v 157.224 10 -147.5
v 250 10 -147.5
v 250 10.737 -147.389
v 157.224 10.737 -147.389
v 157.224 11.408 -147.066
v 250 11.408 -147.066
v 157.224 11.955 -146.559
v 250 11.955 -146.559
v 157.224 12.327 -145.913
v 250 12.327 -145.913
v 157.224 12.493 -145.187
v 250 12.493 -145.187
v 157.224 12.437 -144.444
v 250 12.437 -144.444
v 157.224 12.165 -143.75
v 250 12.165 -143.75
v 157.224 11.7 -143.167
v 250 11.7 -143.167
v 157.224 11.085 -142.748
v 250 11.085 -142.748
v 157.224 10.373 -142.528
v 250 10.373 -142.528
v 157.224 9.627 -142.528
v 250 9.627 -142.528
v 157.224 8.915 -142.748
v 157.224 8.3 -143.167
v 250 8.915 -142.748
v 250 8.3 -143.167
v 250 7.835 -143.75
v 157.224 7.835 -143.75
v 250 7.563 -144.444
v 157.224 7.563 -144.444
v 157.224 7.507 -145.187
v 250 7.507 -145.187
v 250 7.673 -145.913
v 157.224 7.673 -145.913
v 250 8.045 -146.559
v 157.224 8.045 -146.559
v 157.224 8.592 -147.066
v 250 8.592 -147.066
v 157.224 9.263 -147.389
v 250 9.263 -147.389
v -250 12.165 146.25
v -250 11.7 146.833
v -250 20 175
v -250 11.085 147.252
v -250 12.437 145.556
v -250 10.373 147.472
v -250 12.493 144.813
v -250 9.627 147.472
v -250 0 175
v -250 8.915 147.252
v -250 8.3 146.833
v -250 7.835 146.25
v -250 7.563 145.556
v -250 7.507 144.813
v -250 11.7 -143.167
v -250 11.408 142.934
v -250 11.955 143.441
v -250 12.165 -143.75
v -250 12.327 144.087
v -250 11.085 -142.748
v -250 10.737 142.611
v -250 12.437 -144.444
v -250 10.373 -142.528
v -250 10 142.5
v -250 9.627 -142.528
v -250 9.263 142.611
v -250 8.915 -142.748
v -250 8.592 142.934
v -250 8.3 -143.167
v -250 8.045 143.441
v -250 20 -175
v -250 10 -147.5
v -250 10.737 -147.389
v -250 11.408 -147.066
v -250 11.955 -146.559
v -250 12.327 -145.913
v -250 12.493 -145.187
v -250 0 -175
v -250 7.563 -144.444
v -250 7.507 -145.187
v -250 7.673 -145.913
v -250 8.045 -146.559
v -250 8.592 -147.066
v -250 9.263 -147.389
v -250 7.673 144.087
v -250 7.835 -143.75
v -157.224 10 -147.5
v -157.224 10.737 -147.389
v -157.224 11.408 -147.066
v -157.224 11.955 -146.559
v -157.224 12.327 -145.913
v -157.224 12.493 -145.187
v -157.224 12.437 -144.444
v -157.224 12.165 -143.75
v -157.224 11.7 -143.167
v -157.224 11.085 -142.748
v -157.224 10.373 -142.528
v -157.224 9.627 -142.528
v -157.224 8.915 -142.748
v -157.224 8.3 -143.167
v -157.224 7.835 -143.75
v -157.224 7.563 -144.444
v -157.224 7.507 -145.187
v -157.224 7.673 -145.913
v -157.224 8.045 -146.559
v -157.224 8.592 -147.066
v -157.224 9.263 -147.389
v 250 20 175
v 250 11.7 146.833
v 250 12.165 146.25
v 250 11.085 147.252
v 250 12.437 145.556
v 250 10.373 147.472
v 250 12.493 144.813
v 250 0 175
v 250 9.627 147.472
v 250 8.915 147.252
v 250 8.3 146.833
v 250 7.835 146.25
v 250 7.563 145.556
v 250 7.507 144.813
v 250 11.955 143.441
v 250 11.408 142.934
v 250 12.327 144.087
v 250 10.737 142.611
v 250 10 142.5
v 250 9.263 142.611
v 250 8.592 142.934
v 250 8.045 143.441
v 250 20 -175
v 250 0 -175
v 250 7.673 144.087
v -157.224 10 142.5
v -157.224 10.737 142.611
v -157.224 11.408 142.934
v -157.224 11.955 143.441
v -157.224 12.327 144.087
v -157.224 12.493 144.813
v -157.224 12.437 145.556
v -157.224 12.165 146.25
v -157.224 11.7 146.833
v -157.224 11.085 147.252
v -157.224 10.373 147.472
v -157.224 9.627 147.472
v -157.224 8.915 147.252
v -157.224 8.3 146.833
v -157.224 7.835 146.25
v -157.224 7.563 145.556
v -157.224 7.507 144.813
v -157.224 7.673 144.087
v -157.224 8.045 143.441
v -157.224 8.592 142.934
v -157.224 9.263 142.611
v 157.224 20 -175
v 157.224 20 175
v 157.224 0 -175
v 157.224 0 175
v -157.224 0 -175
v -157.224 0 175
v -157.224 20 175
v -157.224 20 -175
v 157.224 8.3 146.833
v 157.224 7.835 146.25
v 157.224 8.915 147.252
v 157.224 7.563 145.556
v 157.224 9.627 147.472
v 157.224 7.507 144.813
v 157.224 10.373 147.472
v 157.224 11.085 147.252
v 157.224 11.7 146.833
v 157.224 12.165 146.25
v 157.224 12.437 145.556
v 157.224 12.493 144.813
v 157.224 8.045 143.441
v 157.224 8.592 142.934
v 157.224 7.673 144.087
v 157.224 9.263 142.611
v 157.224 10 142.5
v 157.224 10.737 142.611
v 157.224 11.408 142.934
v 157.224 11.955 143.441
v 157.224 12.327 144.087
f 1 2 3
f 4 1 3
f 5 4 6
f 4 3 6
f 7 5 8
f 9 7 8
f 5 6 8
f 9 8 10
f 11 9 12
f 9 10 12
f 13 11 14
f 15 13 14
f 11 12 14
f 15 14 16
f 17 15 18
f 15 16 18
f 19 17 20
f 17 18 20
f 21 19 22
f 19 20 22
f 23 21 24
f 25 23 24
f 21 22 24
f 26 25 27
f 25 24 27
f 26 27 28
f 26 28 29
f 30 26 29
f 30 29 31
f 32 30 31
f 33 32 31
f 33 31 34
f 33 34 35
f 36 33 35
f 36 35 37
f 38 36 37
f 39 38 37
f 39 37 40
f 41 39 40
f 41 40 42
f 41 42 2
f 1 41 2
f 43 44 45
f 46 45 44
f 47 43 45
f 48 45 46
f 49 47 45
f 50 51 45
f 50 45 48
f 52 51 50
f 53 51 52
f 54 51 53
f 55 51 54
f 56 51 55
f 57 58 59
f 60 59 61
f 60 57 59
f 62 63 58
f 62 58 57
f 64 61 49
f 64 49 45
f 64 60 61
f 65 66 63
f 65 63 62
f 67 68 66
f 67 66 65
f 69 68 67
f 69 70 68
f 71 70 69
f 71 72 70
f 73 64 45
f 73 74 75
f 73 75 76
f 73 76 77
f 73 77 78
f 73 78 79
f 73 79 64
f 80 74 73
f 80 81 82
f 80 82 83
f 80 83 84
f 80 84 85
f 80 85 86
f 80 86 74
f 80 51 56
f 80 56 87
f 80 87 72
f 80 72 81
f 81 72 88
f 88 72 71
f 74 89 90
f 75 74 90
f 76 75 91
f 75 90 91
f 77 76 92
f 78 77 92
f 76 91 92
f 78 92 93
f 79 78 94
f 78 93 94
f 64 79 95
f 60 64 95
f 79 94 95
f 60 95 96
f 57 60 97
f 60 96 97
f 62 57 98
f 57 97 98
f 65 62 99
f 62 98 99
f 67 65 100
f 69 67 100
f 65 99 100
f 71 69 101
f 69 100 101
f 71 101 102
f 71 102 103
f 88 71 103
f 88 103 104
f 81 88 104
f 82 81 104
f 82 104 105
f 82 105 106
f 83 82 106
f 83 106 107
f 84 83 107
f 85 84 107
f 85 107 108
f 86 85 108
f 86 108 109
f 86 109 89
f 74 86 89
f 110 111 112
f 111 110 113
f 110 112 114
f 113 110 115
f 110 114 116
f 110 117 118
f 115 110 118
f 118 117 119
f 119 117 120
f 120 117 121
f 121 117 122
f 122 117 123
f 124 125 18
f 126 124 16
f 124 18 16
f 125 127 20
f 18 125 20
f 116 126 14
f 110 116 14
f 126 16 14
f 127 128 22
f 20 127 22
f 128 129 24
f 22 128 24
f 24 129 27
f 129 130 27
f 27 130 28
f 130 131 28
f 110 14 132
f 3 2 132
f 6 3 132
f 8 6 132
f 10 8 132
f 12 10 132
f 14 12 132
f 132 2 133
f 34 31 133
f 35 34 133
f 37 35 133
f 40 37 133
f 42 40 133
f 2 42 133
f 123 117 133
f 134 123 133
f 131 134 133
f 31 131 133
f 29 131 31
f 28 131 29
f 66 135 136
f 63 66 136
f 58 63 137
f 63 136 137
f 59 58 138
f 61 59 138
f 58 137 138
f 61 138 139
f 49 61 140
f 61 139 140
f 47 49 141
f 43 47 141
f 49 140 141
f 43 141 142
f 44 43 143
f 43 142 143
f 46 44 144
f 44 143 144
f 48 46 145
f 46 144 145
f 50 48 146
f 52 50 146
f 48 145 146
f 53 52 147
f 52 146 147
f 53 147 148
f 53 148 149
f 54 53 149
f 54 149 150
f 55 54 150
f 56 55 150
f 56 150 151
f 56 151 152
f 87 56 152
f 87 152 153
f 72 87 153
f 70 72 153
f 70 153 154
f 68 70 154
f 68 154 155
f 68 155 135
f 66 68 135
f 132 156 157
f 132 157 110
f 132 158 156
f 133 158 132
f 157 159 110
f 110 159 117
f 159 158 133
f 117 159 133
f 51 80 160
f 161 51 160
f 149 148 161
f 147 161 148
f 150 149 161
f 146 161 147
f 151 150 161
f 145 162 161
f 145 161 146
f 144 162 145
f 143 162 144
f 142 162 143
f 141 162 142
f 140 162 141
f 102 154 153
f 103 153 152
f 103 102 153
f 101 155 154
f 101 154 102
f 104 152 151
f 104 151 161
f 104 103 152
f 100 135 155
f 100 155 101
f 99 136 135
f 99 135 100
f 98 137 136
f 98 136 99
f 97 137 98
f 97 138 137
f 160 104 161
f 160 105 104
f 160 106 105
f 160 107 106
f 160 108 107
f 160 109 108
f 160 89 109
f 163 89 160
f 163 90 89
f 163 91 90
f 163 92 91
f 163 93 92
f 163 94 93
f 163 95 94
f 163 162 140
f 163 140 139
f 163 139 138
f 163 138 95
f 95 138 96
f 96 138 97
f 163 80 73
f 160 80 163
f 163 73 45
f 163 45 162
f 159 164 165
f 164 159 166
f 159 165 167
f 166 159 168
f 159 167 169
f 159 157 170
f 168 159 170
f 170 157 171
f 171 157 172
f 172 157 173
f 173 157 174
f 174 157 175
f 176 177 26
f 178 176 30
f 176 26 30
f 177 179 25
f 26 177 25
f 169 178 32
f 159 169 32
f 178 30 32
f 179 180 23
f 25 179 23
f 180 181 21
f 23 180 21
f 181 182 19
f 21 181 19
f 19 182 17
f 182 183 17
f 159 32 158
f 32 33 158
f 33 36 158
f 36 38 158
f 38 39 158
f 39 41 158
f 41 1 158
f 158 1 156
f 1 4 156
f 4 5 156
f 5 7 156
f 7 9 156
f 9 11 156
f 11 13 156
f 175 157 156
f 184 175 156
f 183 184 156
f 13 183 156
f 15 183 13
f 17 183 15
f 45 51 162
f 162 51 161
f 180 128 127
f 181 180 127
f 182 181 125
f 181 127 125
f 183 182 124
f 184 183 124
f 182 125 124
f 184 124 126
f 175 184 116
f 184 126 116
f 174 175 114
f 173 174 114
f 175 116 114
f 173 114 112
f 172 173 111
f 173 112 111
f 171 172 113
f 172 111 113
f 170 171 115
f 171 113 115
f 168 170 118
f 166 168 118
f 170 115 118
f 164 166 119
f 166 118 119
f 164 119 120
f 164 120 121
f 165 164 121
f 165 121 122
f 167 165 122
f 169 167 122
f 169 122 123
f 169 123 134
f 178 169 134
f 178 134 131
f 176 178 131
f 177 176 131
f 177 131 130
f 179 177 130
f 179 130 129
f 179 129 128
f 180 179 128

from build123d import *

# Parameters (mm, degrees)
SKETCH1_W           = 500
SKETCH1_H           = 350
BOSS_EXTRUDE1_DEPTH = 20
SKETCH2_W           = 314.448097146
SKETCH2_H           = 350
CUT_EXTRUDE1_DEPTH  = 306.818573667
SKETCH4_R           = 2.5
CUT_EXTRUDE2_DEPTH  = 531.117911412


with BuildPart() as part:
    # Sketch1 → Boss-Extrude1 (new body)
    with BuildSketch(Plane(origin=(0, 0, 0), x_dir=(1, 0, 0), z_dir=(0, 1, 0))):
        Rectangle(SKETCH1_W, SKETCH1_H)
    extrude(amount=BOSS_EXTRUDE1_DEPTH)

    # Sketch2 → Cut-Extrude1 (cut, through all)
    with BuildSketch(Plane(origin=(0, 20, 0), x_dir=(1, 0, 0), z_dir=(0, 1, 0))):
        Rectangle(SKETCH2_W, SKETCH2_H)
    extrude(amount=-CUT_EXTRUDE1_DEPTH, mode=Mode.SUBTRACT)


with BuildPart() as cut_extrude1_piece_1:
    # of the separate pieces the step leaves, piece 1, a body of its own (cut_extrude1_pieces)
    add(part.part.solids().sort_by_distance((157.224048573, 0, -175))[0])


with BuildPart() as cut_extrude1_piece_2:
    # of the separate pieces the step leaves, piece 2, a body of its own (cut_extrude1_pieces)
    add(part.part.solids().sort_by_distance((-250, 0, -175))[0])


with BuildPart() as cut_extrude2_tool:
    # Sketch4 → Cut-Extrude2 (new, through all)
    with BuildSketch(Plane(origin=(250, 0, 0), x_dir=(0, 0, -1), z_dir=(1, 0, 0))):
        with Locations((-145, 10)):
            Circle(SKETCH4_R)
        with Locations((145, 10)):
            Circle(SKETCH4_R)
    extrude(amount=-CUT_EXTRUDE2_DEPTH)


with BuildPart() as cut_extrude1_piece_1_1:
    add(cut_extrude1_piece_1.part)

    # Cut-Extrude2: cut by cut_extrude2_tool
    add(cut_extrude2_tool.part, mode=Mode.SUBTRACT)


with BuildPart() as cut_extrude1_piece_2_1:
    add(cut_extrude1_piece_2.part)

    # Cut-Extrude2: cut by cut_extrude2_tool
    add(cut_extrude2_tool.part, mode=Mode.SUBTRACT)


solid = Compound([cut_extrude1_piece_1_1.part, cut_extrude1_piece_2_1.part])
